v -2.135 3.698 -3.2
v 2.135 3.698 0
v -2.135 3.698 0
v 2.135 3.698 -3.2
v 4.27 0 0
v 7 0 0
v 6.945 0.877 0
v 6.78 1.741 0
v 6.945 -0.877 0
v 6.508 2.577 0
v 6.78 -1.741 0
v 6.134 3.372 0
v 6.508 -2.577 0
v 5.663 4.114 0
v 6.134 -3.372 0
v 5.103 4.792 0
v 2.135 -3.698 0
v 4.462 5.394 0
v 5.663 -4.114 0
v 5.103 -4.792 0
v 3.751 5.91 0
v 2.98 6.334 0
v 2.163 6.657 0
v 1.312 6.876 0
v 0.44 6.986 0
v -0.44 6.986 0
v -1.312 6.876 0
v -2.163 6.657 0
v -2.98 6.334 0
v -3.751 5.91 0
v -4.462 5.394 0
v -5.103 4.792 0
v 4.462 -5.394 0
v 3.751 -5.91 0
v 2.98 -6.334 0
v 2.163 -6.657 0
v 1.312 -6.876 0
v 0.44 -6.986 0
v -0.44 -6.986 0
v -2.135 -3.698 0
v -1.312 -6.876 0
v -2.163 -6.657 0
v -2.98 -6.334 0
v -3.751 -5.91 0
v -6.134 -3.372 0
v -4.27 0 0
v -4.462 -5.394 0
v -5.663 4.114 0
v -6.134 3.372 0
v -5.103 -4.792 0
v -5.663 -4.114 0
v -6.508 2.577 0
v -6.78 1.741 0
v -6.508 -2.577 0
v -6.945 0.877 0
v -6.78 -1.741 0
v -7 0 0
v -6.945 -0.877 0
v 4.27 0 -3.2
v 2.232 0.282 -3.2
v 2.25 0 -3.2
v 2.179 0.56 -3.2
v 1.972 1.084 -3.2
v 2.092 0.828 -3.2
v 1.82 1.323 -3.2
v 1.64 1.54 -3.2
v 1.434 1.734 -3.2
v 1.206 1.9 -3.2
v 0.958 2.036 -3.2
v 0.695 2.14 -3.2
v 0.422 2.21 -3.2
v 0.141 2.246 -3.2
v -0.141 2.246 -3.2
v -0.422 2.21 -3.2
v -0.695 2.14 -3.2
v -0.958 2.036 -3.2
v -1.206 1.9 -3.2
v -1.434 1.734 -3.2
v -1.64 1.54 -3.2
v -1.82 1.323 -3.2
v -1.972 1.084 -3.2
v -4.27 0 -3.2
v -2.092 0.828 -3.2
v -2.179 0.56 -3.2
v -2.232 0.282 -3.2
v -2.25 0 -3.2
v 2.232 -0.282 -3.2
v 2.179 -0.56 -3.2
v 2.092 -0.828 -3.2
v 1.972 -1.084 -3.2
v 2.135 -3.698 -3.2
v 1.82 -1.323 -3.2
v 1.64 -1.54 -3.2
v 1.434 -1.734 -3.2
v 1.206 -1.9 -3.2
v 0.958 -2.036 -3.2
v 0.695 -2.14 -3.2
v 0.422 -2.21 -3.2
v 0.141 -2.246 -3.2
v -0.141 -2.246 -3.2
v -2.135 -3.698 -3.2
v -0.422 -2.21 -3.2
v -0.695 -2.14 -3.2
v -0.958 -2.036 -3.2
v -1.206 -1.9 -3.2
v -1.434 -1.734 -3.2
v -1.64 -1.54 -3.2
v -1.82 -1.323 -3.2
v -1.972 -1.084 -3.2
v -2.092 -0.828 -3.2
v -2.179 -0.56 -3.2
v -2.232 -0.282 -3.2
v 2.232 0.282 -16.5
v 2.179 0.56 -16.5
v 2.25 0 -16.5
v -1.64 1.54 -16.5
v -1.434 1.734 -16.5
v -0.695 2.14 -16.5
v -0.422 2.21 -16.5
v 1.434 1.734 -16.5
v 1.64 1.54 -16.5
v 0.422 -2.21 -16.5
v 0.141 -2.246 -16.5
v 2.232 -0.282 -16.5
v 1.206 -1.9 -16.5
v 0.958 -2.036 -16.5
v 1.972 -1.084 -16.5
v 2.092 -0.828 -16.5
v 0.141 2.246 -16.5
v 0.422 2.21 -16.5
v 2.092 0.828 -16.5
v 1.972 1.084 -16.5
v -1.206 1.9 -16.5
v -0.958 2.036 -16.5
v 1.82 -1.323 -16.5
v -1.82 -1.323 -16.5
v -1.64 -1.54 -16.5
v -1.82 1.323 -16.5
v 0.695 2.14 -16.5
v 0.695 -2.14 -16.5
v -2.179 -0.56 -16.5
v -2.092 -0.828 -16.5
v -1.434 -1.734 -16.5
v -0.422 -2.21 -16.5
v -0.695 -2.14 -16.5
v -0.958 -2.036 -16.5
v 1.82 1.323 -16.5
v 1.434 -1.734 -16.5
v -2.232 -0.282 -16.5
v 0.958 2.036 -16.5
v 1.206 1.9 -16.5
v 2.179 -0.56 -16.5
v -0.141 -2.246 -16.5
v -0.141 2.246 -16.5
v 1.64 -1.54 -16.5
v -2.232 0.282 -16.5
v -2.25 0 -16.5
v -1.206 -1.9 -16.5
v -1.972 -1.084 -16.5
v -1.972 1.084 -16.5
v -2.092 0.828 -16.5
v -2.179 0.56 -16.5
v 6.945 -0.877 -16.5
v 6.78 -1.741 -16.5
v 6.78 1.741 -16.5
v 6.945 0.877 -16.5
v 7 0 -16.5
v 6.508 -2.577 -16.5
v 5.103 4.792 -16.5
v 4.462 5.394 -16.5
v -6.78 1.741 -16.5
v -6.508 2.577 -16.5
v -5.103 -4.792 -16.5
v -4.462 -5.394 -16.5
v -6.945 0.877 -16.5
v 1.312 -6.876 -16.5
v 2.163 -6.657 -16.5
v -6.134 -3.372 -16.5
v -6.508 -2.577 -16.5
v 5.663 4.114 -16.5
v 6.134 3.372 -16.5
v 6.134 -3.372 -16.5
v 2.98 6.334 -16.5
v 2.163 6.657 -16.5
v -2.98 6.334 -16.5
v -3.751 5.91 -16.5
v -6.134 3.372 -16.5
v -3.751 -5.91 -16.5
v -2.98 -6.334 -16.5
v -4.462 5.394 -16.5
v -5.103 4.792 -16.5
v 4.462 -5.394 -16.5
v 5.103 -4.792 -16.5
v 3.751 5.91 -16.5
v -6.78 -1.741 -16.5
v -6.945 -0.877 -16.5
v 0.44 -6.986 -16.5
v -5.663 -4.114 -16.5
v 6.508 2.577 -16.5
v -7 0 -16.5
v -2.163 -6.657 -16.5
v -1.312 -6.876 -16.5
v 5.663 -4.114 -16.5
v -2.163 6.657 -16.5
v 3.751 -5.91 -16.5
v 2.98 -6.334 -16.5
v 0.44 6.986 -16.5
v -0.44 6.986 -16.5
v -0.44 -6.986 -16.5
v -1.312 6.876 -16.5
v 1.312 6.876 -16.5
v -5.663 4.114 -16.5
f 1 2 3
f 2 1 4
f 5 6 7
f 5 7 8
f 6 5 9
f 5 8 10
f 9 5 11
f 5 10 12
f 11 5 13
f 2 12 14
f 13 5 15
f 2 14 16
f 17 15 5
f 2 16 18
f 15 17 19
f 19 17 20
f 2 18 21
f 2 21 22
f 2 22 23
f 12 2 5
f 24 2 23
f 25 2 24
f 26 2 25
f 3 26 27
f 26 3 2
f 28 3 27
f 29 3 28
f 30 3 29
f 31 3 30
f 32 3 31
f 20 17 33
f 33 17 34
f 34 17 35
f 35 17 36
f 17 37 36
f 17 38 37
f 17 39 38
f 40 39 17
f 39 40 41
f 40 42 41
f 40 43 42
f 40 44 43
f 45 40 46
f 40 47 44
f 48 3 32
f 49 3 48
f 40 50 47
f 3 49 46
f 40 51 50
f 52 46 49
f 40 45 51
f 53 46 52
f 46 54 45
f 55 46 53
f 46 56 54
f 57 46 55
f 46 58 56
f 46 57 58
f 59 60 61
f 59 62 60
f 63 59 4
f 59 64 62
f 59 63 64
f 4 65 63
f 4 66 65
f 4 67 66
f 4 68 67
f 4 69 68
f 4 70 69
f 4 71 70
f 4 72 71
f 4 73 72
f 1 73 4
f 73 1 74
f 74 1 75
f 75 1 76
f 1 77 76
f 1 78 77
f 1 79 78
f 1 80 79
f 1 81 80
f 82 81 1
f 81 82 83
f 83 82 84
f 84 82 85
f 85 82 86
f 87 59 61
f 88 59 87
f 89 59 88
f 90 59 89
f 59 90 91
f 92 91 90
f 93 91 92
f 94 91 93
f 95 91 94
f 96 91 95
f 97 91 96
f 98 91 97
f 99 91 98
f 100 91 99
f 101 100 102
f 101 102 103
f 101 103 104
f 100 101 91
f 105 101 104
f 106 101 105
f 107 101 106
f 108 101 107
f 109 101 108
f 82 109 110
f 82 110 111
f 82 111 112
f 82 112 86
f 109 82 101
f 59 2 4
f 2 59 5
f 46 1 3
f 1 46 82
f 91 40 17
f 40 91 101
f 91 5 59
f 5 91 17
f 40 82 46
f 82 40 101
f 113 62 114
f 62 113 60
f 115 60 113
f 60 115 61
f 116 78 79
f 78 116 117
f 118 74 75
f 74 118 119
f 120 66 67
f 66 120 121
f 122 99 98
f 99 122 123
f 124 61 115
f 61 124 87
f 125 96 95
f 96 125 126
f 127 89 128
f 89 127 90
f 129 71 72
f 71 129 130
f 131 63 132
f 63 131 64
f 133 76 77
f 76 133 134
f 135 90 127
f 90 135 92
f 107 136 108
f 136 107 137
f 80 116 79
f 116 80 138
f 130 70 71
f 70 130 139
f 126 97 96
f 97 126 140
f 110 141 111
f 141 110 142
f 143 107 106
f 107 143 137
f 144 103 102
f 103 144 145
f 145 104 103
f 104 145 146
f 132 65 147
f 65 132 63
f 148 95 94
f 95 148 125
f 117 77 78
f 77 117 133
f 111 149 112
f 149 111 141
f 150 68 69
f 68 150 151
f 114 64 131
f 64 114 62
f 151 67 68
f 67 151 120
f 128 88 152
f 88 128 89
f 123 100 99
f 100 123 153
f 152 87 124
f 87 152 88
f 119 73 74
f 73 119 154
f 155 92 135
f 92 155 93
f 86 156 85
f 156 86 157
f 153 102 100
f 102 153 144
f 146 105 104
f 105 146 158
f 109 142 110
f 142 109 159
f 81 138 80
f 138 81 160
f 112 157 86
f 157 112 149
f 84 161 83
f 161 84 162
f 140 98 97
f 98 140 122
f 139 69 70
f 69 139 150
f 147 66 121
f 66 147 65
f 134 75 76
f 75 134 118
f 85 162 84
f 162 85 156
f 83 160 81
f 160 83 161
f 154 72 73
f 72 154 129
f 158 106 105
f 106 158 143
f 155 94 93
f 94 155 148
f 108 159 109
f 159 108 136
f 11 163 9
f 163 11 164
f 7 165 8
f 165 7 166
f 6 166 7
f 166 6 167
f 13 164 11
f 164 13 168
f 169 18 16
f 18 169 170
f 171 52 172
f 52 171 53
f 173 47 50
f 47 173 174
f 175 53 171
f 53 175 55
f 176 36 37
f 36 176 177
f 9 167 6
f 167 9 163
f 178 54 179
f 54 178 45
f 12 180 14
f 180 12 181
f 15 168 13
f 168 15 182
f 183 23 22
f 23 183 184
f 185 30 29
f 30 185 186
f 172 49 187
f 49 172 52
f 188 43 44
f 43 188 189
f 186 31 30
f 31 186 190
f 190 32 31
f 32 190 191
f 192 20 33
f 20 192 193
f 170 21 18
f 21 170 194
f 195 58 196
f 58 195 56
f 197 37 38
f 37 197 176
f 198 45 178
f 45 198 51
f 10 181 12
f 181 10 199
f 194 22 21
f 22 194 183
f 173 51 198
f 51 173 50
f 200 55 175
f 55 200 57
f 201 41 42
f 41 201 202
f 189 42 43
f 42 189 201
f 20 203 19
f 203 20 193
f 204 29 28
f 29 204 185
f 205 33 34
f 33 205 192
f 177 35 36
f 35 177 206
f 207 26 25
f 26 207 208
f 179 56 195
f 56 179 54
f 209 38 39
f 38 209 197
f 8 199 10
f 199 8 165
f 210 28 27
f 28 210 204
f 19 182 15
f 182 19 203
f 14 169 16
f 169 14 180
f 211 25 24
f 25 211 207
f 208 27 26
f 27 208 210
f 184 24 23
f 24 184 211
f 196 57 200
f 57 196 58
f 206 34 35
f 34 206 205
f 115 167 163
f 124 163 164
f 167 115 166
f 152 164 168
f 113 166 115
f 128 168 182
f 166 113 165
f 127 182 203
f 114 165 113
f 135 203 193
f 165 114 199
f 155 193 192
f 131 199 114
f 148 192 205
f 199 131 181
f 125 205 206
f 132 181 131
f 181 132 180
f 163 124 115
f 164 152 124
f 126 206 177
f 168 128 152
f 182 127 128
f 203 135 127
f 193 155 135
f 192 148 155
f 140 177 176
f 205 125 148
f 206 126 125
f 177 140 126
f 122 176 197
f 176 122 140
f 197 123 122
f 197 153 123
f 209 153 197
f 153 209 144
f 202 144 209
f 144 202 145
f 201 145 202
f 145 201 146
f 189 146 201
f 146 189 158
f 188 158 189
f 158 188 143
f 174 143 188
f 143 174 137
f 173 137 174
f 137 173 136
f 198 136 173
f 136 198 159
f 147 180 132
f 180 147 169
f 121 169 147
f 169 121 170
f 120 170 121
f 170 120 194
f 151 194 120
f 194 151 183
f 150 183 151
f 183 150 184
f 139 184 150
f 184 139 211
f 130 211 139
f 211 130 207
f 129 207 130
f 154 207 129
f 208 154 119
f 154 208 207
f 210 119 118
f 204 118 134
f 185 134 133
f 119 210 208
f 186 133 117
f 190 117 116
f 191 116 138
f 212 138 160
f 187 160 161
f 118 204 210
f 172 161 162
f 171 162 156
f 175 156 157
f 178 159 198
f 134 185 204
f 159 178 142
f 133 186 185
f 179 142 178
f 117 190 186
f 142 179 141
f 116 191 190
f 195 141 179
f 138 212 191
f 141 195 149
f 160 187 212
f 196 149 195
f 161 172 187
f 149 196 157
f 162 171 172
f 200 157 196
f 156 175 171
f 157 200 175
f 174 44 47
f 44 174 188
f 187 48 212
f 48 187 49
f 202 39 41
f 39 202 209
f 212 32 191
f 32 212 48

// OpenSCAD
$fn = 50;

difference() {
	union() {
		translate(v = [0, 0, -16.5]) {
			cylinder(h = 16.5, r = 7.0);
		}
	}
	union() {
		translate(v = [0, 0, 0]) {
			rotate(a = [0, 0, 0]) {
				difference() {
					union() {
						translate(v = [0, 0, -3.2]) {
							linear_extrude(height = 3.2) {
								polygon(points = [[4.2698, 0.0], [2.1349000000000005, 3.697755269078796], [-2.134899999999999, 3.6977552690787965], [-4.2698, 5.228996902999369e-16], [-2.134900000000002, -3.6977552690787956], [2.1348999999999974, -3.697755269078798]]);
							}
						}
					}
					union();
				}
			}
		}
		#translate(v = [0, 0, -100.0]) {
			cylinder(h = 200, r = 2.25);
		}
	}
}
